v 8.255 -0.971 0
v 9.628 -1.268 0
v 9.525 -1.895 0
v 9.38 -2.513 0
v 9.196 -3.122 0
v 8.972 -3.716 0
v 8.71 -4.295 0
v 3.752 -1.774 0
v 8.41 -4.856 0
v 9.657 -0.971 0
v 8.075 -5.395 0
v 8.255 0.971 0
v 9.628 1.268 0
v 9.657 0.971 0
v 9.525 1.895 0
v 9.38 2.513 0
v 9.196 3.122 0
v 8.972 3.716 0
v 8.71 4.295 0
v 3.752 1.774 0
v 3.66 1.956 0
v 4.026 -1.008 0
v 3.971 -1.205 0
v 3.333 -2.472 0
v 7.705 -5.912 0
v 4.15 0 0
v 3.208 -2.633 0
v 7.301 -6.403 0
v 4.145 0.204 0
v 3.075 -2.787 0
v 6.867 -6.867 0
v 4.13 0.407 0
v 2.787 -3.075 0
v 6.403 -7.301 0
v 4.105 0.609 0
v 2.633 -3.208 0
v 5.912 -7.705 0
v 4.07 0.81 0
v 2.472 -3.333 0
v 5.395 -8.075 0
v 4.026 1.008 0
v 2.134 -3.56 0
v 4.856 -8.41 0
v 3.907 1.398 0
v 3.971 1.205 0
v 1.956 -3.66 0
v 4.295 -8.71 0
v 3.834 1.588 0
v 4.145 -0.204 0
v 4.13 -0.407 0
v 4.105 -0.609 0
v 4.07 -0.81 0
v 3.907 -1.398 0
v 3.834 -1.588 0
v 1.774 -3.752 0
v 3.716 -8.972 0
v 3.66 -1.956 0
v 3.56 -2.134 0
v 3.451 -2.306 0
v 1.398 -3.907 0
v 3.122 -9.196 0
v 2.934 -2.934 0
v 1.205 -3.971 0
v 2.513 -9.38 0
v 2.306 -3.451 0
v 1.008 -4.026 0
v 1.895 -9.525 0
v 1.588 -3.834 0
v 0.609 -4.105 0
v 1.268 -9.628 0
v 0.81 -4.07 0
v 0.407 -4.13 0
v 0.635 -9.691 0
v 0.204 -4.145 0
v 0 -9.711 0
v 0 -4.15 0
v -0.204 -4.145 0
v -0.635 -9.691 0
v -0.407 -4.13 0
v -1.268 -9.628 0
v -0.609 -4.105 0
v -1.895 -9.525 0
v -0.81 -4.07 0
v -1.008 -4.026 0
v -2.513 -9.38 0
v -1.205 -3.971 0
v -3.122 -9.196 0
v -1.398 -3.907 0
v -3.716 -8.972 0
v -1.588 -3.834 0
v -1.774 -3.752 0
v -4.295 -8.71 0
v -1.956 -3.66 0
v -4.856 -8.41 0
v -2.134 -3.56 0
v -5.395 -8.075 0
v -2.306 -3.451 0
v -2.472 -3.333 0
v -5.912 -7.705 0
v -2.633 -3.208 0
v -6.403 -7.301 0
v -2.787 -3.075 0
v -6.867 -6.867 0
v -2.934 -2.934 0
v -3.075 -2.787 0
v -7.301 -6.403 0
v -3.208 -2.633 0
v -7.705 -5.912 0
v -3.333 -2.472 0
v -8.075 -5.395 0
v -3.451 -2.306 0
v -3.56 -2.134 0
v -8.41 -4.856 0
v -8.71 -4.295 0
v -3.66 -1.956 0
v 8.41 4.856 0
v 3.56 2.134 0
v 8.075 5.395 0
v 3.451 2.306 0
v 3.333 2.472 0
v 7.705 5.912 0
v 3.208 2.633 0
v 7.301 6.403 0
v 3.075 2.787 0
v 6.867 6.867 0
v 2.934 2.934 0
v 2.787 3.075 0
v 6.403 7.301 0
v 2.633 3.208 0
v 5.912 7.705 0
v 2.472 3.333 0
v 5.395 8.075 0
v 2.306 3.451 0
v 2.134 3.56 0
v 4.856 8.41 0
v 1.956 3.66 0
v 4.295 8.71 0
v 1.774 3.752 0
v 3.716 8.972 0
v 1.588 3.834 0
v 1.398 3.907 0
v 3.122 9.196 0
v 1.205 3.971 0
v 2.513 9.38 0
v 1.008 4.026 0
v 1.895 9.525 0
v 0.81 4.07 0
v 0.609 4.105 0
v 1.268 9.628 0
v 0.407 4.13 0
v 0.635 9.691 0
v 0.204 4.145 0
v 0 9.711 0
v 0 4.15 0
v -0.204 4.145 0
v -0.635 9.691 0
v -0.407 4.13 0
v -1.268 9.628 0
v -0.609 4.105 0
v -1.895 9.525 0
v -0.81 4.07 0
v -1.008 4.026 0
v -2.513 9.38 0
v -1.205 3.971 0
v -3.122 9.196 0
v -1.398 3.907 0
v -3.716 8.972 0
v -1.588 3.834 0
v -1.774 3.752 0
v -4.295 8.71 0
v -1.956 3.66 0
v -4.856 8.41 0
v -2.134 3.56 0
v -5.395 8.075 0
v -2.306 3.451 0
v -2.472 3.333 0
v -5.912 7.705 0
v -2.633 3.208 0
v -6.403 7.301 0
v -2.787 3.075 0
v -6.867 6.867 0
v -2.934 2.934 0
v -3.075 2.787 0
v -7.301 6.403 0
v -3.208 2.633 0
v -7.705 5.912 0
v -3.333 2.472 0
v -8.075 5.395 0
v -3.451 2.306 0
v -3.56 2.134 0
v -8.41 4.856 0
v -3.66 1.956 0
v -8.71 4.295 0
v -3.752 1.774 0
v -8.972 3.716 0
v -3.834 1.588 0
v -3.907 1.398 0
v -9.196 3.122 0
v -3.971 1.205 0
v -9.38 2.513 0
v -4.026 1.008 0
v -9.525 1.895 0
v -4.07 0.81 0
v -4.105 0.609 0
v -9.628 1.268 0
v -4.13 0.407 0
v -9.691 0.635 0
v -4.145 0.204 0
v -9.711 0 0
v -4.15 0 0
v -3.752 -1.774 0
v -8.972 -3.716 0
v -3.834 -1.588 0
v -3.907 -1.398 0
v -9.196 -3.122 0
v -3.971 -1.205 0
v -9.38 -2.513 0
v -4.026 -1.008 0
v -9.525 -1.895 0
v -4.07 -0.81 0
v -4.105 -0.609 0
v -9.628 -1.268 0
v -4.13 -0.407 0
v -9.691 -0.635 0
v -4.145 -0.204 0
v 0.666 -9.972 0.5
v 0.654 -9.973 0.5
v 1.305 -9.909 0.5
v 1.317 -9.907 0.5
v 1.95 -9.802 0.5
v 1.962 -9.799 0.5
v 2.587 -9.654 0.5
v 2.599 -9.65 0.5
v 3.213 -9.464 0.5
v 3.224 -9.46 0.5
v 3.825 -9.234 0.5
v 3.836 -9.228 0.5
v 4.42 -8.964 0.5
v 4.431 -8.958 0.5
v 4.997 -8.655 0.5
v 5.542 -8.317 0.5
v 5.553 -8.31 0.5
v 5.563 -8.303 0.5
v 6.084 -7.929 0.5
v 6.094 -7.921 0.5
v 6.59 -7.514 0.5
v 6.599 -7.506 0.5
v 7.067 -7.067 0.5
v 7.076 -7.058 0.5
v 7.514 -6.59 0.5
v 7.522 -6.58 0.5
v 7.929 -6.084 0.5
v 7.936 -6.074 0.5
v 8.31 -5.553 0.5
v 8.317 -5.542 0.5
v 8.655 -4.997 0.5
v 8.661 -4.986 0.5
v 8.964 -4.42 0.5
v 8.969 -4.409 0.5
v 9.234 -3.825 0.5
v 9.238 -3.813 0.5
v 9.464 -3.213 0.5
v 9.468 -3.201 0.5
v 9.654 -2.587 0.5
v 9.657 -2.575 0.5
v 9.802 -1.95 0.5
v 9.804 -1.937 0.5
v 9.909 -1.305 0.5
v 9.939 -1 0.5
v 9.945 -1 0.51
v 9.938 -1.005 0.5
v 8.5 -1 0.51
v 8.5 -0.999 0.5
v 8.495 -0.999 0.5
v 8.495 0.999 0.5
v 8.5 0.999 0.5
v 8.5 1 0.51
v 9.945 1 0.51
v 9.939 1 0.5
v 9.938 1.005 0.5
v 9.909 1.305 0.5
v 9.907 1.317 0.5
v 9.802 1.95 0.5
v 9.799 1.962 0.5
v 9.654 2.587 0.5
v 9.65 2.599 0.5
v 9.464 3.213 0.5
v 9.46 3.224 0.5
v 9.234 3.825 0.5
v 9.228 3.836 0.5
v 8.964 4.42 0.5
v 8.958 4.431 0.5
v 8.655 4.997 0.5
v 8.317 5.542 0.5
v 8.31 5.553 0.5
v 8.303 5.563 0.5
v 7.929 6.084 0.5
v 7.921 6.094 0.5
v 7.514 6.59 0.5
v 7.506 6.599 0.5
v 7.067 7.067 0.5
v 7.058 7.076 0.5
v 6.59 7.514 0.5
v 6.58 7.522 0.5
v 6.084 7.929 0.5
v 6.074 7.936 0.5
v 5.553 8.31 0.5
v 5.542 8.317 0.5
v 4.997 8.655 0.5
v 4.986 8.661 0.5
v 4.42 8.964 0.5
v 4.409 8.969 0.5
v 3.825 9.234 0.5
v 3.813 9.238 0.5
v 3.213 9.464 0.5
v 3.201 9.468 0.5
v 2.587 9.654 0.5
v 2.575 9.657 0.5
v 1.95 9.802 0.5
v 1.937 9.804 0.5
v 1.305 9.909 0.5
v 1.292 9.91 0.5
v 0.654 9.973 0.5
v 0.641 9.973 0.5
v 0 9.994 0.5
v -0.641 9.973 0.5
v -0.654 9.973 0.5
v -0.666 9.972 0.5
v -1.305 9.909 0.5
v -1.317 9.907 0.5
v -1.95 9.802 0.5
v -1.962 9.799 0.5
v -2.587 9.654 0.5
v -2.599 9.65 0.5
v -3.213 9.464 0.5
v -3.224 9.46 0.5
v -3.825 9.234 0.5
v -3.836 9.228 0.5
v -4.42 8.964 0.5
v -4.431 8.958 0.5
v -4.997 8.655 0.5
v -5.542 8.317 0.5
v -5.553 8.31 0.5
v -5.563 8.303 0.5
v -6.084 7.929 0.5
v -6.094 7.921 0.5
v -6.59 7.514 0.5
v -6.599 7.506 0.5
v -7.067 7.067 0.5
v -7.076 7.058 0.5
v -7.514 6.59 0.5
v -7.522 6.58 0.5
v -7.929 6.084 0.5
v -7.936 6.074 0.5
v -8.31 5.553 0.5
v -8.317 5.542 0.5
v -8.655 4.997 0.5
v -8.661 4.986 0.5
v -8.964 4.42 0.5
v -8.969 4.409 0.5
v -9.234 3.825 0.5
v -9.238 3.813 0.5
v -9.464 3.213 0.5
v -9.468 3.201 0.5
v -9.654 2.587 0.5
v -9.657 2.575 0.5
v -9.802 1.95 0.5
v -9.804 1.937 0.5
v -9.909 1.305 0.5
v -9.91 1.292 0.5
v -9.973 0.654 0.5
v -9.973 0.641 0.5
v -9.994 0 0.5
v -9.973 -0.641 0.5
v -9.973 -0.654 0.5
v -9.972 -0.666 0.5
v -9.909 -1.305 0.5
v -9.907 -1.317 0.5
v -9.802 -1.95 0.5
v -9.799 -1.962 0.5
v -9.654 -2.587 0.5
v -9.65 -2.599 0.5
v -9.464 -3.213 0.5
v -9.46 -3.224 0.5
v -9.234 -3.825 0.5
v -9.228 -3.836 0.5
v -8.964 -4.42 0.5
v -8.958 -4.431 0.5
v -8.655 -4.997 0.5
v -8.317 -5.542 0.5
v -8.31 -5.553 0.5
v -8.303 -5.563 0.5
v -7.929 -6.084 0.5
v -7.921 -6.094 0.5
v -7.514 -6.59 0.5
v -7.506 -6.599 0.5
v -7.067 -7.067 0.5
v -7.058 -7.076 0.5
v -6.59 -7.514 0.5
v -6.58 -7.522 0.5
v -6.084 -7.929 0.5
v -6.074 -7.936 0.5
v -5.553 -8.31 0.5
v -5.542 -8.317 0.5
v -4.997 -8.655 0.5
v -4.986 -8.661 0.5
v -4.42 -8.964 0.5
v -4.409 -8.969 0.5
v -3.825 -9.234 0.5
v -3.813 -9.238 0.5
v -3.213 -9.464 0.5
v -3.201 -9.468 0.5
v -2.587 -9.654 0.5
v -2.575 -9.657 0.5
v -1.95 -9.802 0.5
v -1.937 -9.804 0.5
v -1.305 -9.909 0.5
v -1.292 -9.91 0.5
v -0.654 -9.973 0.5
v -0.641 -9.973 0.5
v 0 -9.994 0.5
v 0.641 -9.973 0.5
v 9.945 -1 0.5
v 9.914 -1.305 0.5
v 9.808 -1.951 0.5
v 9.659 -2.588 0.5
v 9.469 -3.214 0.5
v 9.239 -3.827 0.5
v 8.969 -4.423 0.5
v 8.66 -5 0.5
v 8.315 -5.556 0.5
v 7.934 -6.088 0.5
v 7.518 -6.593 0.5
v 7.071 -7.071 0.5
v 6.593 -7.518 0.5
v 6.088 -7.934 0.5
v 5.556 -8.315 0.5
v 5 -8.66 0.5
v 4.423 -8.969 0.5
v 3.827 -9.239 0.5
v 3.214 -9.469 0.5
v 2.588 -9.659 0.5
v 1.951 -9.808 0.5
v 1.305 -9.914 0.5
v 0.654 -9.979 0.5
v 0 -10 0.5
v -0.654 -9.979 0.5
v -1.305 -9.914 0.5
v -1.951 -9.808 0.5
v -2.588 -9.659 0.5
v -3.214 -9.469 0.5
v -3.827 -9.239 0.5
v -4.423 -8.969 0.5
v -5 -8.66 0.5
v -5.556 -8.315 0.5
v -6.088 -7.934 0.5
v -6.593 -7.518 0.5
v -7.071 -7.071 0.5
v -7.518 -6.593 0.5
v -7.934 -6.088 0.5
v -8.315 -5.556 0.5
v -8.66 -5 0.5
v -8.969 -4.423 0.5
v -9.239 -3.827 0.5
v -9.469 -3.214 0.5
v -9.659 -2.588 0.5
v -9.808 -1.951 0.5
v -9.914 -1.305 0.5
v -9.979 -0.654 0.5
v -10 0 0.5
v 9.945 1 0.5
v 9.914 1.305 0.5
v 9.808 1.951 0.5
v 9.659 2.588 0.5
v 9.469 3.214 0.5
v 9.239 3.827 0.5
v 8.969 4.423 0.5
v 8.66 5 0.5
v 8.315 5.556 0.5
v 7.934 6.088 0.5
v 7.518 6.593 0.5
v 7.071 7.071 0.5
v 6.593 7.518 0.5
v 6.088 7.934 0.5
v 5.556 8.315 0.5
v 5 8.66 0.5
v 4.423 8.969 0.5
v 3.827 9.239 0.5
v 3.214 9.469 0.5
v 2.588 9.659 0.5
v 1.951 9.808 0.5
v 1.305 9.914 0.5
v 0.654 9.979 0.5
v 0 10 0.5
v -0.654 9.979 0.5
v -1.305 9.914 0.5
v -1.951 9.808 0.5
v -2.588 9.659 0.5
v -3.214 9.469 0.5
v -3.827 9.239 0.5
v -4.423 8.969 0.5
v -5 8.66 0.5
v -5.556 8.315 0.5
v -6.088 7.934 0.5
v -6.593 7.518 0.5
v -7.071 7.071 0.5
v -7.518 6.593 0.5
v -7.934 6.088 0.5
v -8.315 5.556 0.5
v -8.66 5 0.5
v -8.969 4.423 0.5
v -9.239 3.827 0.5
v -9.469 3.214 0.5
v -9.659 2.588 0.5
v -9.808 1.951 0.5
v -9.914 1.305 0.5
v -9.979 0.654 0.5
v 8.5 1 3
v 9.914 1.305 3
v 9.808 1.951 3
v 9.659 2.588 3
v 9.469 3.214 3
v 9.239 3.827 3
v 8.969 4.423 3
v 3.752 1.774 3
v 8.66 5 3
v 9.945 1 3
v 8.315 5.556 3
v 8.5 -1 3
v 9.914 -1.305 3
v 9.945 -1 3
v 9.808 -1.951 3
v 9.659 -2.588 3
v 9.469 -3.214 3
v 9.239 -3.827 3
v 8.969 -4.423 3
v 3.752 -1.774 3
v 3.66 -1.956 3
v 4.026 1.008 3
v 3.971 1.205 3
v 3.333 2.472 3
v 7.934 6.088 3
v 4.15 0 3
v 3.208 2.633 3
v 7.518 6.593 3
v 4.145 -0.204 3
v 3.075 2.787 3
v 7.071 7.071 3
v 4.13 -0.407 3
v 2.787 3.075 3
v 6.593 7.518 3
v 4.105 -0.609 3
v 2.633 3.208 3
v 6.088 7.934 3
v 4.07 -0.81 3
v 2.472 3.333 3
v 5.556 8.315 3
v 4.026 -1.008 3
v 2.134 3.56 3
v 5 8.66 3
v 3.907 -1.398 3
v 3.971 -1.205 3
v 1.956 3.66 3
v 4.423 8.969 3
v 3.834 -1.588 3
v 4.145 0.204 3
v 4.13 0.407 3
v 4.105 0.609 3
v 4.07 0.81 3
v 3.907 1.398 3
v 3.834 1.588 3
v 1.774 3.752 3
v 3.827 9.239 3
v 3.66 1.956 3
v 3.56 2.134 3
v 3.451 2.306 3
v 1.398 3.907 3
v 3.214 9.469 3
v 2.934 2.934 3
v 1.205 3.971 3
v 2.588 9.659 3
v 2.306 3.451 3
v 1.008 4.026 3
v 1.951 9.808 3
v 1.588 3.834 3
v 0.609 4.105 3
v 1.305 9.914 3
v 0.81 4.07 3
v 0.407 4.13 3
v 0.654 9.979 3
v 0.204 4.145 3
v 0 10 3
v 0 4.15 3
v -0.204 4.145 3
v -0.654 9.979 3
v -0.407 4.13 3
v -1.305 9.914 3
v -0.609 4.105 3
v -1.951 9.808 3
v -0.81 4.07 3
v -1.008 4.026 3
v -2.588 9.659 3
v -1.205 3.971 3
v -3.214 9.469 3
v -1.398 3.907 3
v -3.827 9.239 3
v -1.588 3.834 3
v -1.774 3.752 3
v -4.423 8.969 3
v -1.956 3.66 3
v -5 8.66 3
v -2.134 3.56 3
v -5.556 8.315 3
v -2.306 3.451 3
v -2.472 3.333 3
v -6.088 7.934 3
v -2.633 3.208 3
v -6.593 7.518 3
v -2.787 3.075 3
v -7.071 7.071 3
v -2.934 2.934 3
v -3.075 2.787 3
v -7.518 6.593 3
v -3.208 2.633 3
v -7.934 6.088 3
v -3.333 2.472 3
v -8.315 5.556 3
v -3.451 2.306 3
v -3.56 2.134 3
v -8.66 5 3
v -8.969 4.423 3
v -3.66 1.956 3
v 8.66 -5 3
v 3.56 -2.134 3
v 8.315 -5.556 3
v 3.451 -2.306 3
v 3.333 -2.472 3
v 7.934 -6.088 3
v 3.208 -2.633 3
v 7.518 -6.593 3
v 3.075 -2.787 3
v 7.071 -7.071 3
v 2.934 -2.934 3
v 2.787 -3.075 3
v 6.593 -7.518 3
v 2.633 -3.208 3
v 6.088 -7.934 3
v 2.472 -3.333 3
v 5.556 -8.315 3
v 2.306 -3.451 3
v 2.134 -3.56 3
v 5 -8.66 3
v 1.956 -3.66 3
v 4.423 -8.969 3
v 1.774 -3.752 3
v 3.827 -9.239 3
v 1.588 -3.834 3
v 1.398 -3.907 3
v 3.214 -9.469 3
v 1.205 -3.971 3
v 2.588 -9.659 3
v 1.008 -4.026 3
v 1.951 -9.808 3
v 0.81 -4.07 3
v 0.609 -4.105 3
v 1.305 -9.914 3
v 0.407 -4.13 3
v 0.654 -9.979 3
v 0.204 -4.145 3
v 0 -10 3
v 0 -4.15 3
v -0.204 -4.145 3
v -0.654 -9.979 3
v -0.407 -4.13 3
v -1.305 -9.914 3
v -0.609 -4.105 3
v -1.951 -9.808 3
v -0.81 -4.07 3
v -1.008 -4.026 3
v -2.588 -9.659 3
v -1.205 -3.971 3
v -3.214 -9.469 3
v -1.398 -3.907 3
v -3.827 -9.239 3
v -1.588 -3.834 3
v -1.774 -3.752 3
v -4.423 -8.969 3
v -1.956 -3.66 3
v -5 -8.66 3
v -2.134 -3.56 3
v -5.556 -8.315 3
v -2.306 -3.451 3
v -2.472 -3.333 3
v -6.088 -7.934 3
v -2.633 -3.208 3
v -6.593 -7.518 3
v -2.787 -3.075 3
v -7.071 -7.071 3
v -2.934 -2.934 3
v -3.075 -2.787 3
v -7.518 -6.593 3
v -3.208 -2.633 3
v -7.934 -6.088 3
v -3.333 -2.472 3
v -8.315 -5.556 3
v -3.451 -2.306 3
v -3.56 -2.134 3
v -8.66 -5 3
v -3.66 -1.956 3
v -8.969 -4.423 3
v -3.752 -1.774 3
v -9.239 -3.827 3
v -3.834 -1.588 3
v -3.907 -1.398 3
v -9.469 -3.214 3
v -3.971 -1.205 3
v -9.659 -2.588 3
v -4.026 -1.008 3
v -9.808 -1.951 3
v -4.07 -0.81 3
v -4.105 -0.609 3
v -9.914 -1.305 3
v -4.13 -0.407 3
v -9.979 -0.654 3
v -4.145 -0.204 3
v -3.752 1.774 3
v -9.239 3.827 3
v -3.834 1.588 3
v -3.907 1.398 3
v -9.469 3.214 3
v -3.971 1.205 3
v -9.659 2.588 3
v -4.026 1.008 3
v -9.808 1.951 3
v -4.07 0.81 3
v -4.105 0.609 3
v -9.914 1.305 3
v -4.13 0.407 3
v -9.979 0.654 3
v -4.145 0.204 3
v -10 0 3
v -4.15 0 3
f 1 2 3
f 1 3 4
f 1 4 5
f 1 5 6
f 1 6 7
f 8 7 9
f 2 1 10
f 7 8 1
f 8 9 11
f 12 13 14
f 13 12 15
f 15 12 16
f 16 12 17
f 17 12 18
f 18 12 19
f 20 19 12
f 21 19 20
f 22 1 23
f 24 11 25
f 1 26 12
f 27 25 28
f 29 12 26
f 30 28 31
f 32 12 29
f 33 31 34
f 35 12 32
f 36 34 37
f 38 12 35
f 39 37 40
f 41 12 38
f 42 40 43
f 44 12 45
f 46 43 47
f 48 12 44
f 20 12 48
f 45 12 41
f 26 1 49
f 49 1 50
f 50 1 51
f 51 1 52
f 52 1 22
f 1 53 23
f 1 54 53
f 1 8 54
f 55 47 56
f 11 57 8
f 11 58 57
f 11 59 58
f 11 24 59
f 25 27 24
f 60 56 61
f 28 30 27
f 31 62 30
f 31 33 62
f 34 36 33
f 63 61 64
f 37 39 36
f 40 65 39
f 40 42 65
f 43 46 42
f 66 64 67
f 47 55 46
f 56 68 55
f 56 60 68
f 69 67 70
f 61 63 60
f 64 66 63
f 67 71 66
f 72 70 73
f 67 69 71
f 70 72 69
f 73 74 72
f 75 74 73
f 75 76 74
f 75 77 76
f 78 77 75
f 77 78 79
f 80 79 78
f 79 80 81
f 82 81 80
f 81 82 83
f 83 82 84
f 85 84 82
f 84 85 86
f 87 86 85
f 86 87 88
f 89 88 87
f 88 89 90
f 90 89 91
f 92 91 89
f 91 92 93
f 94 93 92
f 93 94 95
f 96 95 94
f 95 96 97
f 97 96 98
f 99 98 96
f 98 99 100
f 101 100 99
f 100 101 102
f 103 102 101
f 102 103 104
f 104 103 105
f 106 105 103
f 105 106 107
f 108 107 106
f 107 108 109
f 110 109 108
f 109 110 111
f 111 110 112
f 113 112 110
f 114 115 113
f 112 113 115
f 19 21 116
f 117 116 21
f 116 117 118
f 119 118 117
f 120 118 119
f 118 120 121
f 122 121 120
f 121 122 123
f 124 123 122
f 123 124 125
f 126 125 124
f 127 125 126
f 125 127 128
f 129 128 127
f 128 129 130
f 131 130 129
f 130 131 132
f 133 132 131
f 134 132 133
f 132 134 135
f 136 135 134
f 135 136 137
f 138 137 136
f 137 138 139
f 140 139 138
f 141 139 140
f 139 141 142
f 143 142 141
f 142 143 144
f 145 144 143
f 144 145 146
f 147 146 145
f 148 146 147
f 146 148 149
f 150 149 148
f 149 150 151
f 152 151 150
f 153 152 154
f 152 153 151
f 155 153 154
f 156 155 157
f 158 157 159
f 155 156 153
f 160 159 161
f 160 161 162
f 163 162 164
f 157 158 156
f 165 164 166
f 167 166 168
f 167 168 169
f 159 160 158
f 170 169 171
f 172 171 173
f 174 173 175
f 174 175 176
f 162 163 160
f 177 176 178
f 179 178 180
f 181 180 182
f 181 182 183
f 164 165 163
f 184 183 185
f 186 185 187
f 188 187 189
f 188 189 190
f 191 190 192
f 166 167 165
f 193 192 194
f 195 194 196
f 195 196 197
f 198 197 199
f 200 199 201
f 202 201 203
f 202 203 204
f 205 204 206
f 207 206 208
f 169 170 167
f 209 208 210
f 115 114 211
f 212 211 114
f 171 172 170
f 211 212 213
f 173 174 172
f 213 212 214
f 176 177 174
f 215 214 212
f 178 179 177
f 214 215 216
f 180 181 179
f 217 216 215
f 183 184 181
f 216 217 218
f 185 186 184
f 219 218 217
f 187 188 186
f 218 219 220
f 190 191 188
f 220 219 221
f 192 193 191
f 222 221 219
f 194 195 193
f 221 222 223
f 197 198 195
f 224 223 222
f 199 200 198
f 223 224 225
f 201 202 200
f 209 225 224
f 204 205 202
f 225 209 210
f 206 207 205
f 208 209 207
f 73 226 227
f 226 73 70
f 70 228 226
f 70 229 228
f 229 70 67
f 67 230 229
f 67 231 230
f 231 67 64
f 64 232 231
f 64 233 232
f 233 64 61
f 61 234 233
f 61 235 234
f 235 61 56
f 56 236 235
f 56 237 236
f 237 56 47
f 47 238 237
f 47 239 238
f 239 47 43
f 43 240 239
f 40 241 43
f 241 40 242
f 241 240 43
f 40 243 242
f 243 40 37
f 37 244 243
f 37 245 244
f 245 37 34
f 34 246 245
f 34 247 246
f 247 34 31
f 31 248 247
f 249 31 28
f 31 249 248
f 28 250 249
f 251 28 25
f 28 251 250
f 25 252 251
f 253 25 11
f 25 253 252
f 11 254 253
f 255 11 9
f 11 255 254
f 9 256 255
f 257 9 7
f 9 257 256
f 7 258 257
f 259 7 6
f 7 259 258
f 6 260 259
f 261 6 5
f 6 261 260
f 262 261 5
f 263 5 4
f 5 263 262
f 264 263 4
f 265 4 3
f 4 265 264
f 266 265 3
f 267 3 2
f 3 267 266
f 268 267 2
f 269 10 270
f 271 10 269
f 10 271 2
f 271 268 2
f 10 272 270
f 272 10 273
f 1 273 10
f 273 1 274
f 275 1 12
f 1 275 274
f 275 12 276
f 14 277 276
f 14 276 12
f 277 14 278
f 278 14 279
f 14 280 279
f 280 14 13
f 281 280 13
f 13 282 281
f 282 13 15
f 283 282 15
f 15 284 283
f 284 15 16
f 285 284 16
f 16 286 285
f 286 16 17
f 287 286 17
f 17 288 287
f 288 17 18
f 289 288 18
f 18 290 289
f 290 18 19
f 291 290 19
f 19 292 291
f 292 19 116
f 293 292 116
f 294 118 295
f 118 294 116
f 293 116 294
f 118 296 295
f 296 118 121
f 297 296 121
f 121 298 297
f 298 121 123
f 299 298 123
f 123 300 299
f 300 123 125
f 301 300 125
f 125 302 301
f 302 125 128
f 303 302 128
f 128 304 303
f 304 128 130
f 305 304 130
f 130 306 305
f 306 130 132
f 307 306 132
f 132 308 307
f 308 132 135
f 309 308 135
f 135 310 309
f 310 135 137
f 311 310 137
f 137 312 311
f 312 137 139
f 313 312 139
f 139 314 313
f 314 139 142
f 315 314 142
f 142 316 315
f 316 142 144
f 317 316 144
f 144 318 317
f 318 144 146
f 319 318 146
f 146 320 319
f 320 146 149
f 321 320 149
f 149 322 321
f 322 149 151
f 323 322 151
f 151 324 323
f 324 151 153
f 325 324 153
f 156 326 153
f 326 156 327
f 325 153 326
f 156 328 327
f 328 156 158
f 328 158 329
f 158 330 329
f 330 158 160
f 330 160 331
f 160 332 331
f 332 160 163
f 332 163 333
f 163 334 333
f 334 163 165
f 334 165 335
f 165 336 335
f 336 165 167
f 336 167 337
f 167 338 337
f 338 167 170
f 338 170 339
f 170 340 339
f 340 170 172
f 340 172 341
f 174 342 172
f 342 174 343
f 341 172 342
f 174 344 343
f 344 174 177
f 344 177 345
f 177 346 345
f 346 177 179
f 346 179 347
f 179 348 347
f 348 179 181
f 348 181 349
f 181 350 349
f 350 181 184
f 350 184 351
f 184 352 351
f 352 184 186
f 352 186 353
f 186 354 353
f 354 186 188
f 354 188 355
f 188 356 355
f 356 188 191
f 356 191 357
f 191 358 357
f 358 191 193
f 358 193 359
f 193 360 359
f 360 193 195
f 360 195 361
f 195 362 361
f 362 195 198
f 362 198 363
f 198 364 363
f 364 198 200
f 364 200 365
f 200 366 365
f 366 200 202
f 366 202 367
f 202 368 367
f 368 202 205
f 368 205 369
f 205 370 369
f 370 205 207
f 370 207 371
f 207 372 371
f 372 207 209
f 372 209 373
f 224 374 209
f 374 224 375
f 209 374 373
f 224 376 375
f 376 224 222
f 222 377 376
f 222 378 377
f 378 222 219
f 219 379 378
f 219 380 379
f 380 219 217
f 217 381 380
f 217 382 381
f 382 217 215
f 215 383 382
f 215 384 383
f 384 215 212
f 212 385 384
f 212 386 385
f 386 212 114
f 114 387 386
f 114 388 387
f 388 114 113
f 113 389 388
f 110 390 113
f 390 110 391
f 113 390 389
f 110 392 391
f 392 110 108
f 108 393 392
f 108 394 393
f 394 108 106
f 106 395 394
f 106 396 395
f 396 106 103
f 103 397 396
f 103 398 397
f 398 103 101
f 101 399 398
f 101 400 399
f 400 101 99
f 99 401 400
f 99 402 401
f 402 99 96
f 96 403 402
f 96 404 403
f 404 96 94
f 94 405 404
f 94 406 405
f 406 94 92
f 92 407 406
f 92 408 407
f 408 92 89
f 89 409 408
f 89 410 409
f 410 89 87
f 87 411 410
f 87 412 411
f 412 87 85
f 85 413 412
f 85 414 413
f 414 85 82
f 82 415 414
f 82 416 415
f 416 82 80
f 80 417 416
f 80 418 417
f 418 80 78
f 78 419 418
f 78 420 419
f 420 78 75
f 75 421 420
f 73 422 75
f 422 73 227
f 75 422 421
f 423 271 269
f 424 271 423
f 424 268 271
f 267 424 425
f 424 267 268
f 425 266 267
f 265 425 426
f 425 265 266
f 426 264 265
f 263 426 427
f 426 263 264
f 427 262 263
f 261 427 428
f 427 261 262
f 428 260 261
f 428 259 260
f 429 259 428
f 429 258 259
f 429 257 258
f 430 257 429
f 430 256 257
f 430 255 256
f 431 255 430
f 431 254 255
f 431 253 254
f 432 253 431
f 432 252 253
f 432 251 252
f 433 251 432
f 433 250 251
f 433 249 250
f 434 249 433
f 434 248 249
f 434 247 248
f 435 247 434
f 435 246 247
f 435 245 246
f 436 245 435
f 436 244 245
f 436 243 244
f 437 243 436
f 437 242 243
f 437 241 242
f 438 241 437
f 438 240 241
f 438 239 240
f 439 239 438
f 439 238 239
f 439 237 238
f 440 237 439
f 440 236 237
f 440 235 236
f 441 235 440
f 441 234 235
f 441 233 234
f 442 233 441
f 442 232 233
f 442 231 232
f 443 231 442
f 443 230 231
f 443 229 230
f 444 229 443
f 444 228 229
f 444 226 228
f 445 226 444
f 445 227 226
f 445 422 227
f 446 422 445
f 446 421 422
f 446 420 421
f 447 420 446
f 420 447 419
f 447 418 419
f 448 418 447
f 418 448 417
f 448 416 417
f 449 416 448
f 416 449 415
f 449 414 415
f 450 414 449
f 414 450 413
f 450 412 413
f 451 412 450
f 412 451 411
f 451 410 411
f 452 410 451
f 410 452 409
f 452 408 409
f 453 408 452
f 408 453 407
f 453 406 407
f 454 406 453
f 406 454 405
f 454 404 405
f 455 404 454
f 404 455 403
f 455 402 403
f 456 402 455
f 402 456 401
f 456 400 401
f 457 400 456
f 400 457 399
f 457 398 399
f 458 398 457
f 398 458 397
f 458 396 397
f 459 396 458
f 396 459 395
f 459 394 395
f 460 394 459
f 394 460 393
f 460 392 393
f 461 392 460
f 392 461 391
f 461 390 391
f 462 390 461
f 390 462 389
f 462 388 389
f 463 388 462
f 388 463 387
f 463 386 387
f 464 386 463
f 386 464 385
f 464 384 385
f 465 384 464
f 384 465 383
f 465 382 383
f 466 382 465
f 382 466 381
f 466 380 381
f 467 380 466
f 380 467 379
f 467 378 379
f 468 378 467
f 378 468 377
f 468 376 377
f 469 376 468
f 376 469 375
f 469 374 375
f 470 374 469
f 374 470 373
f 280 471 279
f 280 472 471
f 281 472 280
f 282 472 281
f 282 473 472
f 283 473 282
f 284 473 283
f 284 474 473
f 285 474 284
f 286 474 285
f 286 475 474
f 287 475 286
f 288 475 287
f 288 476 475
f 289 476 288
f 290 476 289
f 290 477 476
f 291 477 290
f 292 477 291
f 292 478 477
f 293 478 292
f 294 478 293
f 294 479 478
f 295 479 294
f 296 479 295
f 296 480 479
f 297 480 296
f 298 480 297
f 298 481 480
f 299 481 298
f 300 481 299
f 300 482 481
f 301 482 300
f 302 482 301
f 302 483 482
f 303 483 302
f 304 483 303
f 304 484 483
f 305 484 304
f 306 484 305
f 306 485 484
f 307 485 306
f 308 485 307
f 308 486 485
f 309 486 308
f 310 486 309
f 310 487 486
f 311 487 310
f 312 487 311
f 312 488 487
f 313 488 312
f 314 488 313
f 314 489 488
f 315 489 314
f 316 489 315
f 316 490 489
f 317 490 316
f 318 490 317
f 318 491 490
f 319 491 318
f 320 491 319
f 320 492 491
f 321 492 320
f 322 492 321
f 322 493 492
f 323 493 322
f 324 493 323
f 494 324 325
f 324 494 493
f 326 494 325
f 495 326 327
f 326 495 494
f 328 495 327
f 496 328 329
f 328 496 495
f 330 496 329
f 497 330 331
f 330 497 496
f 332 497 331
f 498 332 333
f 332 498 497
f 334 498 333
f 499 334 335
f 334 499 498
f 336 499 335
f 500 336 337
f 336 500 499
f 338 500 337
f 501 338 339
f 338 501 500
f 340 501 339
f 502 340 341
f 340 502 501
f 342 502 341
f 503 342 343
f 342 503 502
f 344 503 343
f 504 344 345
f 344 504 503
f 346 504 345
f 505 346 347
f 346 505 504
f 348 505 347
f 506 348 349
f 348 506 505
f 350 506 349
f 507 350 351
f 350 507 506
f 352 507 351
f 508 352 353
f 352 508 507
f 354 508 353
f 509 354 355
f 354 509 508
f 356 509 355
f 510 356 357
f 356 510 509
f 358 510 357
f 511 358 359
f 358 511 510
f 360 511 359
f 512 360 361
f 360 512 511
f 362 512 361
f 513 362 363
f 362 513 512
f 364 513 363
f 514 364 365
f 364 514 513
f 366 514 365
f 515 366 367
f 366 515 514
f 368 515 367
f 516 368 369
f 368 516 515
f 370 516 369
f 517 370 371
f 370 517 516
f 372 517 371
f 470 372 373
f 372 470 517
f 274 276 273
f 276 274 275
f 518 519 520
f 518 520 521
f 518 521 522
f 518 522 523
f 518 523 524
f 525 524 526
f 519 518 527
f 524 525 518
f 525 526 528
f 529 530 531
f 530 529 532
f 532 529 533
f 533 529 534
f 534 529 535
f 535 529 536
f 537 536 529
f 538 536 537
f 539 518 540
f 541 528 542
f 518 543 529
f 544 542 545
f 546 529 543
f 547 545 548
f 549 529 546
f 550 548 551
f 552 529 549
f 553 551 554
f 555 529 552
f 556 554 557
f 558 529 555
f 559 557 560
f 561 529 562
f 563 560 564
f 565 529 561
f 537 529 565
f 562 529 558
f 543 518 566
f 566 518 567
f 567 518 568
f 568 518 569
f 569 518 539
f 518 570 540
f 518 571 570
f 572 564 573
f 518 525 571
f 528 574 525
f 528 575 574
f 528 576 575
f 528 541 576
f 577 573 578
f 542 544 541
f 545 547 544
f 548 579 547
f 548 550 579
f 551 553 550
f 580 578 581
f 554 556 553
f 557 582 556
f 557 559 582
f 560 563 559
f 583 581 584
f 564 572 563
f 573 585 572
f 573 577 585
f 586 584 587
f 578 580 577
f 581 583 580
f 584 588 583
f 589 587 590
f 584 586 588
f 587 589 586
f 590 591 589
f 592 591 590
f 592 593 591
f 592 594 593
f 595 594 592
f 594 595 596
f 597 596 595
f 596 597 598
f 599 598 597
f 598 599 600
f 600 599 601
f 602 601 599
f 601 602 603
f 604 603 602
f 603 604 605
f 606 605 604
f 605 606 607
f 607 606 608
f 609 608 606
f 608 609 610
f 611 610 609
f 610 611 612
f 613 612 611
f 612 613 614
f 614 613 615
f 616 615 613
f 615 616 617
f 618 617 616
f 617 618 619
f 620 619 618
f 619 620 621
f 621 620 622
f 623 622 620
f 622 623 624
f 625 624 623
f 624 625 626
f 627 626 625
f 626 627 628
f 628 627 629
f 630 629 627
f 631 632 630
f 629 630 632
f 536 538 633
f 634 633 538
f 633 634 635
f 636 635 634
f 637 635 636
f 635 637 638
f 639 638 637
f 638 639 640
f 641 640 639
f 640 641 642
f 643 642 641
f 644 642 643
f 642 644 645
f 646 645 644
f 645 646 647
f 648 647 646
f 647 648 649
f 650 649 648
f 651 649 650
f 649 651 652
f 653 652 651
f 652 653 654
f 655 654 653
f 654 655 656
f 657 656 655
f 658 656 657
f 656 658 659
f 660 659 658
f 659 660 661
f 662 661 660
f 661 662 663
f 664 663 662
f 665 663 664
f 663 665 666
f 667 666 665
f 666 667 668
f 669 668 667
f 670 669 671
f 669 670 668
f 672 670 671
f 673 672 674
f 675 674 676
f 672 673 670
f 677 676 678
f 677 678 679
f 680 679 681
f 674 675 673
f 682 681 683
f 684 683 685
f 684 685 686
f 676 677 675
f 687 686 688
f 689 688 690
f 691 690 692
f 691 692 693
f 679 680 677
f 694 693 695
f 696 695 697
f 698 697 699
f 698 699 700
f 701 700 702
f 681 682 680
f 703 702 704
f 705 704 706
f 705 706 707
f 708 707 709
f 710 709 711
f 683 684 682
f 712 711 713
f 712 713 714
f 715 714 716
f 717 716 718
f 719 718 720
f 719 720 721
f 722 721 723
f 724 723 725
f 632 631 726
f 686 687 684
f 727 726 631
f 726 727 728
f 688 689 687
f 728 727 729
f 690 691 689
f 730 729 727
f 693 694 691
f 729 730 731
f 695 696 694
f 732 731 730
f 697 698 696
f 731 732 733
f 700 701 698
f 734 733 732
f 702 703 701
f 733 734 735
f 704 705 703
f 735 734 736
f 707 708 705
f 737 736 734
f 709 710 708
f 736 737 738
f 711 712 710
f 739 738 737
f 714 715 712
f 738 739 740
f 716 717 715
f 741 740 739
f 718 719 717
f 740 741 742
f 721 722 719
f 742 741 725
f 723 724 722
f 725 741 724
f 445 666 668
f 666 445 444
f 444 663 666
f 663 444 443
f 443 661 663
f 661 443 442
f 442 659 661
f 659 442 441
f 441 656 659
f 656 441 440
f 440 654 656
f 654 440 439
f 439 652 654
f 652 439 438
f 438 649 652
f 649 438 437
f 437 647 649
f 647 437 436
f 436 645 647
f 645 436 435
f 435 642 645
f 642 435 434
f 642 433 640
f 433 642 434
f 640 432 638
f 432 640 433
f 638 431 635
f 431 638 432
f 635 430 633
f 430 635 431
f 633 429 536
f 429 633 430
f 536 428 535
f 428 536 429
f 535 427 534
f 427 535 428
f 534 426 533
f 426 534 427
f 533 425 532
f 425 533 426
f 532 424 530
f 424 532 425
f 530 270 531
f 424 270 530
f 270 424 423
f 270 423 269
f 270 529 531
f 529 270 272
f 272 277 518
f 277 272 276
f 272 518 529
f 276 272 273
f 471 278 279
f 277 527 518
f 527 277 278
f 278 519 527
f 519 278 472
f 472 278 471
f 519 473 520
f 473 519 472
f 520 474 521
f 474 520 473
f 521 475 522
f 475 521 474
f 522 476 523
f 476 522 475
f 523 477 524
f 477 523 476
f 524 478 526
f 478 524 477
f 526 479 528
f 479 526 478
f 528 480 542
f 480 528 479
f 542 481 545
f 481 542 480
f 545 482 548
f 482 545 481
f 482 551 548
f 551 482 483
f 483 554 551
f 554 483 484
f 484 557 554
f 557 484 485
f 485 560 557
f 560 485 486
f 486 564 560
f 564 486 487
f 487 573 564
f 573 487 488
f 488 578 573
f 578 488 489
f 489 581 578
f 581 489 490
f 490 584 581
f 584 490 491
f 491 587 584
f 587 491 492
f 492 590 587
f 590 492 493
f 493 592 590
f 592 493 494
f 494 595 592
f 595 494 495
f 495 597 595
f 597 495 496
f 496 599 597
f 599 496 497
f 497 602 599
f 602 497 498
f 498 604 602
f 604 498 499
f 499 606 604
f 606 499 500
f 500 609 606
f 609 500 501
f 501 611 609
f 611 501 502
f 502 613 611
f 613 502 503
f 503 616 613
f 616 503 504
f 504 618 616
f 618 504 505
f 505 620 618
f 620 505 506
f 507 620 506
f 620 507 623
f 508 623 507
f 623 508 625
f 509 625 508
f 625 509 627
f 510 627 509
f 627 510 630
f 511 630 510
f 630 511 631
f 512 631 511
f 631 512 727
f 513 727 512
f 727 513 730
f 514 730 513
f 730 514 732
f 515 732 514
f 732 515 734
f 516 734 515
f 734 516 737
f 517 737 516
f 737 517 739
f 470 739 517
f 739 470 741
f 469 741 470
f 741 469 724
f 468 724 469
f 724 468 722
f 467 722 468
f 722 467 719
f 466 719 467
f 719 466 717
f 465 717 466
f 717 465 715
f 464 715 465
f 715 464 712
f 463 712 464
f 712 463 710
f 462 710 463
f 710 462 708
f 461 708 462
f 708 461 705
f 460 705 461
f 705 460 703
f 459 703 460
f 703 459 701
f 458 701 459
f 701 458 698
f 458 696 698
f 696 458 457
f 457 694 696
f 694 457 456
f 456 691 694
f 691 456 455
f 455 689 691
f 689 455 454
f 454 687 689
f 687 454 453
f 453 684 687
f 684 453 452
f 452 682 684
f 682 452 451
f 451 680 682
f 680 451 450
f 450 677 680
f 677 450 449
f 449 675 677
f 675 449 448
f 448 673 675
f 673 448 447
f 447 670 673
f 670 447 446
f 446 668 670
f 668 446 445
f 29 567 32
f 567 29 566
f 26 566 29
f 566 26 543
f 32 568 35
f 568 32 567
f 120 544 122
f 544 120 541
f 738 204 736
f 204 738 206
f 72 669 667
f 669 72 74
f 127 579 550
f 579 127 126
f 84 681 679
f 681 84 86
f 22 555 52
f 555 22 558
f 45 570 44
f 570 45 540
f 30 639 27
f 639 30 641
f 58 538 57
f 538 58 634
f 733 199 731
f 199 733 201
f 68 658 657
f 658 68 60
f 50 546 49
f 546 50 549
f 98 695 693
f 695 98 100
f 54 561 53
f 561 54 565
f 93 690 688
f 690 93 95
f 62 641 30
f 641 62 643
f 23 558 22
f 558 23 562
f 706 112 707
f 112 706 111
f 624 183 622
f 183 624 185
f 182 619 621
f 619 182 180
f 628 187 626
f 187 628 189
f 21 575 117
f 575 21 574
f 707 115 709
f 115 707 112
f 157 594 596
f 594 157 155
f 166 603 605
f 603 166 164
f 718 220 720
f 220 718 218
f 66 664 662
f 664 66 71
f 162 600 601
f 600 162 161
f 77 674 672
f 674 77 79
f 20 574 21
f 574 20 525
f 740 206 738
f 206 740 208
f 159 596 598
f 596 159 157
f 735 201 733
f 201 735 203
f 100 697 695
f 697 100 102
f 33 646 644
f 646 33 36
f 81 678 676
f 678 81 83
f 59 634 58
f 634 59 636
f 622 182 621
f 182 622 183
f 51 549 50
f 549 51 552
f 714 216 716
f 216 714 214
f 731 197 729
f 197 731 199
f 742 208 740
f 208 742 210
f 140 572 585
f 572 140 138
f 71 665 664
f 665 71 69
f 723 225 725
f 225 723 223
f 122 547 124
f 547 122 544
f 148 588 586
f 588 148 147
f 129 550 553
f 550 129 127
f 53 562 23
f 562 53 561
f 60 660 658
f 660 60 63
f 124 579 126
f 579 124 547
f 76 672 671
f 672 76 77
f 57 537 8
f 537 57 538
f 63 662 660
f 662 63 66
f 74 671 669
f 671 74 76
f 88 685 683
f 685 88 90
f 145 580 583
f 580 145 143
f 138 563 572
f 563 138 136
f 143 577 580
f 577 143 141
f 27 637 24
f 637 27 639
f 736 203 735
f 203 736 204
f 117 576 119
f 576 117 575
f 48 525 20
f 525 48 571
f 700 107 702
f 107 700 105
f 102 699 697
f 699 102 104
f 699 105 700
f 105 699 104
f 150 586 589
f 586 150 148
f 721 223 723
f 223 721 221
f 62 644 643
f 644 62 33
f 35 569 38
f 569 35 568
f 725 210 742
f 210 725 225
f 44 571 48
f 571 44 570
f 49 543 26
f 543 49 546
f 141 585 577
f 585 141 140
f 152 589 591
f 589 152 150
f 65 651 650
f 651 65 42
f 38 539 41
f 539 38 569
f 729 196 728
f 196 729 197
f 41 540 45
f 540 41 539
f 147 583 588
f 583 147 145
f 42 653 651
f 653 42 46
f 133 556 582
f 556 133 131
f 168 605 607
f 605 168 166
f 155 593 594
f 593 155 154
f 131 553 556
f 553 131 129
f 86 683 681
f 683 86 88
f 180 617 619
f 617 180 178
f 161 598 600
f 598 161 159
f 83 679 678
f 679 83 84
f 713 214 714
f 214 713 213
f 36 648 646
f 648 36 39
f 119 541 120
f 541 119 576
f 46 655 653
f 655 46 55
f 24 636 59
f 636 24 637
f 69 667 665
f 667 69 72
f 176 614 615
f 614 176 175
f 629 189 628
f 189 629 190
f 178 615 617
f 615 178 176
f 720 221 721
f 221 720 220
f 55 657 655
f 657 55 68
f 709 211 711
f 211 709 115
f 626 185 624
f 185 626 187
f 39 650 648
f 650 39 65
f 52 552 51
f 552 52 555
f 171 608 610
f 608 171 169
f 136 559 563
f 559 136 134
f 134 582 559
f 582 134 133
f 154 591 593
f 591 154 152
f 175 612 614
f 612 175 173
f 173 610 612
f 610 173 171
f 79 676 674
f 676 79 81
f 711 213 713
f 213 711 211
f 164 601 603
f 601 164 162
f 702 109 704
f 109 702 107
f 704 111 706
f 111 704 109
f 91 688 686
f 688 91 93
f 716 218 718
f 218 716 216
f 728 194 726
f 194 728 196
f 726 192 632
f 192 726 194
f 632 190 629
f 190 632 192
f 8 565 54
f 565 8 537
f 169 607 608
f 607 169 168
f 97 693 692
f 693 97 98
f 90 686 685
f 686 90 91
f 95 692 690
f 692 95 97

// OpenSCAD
// TEMPLATE: flat spacer / gasket ring — a bore that slides over a bolt or shaft, an outer diameter, a thickness; optional parallel flats (wrench/keying) and a keying notch on the OD
// Interfaces: bolt_d (the bolt's outer diameter) + clearance -> bore. Origin on the bore axis, bottom face on z = 0.
// Print flat (a pure extrusion, no overhangs); the bed-side outer edge gets a light 60° chamfer so the first layer lifts off cleanly.

/* [Interface] */
bolt_d = 8.0;            // [3:0.1:40]  diameter of the bolt / shaft that passes through
clearance = 0.3;         // [0:0.05:0.8]  added to the bore diameter
outer_d = 20;            // [8:0.5:80]
thickness = 3;           // [0.8:0.1:20]

/* [Options] */
flats = false;           // two parallel flats on the outer diameter (for a wrench, or to key against a wall)
across_flats = 17;       // [6:0.5:80]  distance between the flats
notch = true;            // radial keying notch in the outer edge
notch_w = 2;             // [1:0.25:8]
notch_depth = 1.5;       // [0.5:0.25:8]
bed_chamfer = 0.5;       // [0:0.1:1.5]  height of the 60° chamfer on the bottom outer edge

/* [Render] */
render_target = "part";  // [part, coupon, assembly]

/* [Hidden] */
$fn = 96;
bore = bolt_d + clearance;
wall = (outer_d - bore) / 2;
flat_wall = (across_flats - bore) / 2;
chamfer_w = bed_chamfer / tan(60);                 // radial width of the 60° bed chamfer
chamfer_scale = (outer_d / 2 - chamfer_w) / (outer_d / 2);

assert(outer_d > bore + 3.2, "outer_d leaves less than a 1.6 mm wall around the bore");
assert(!flats || across_flats > bore + 3.2, "across_flats leaves less than a 1.6 mm wall around the bore");
assert(!flats || across_flats < outer_d, "across_flats must be smaller than outer_d");
assert(!notch || wall - notch_depth >= 1.6, "the notch cuts the wall below 1.6 mm");
assert(thickness > 2 * bed_chamfer, "thickness must exceed twice the bed chamfer");
echo(bore = bore, wall = wall, min_wall = notch ? wall - notch_depth : (flats ? flat_wall : wall));

module body2d() {
    // outer outline without the bore: circle, optionally clipped by two flats, optionally notched
    difference() {
        intersection() {
            circle(d = outer_d);
            if (flats) square([outer_d + 2, across_flats], center = true);
        }
        if (notch) translate([outer_d / 2 - notch_depth, -notch_w / 2]) square([notch_depth + 1, notch_w]);
    }
}

module ring(bore_d, t) {
    difference() {
        union() {
            // chamfered bottom band (scaled about the axis), then the straight body
            linear_extrude(height = bed_chamfer + 0.01, scale = 1 / chamfer_scale) scale(chamfer_scale) body2d();
            translate([0, 0, bed_chamfer]) linear_extrude(height = t - bed_chamfer) body2d();
        }
        translate([0, 0, -1]) cylinder(d = bore_d, h = t + 2, $fn = 128);
    }
}

module part() { ring(bore, thickness); }

module coupon() {
    // fit ladder: one plate carrying three bosses with the bore at clearance -0.2 / 0 / +0.2, labels embossed on the plate
    pitch = bore + 8;
    plate = [3 * pitch + 4, bore + 13, 1.2];
    difference() {
        union() {
            translate([-plate[0] / 2, -plate[1] / 2, 0]) cube(plate);
            for (i = [-1, 0, 1]) translate([i * pitch, 0, 0]) cylinder(d = bore + 5, h = plate[2] + thickness);
            for (i = [-1, 0, 1]) translate([i * pitch, plate[1] / 2 - 3.2, plate[2]])
                linear_extrude(0.6) text(str(i * 0.2), size = 2.6, halign = "center", $fn = 16);
        }
        for (i = [-1, 0, 1]) translate([i * pitch, 0, -1]) cylinder(d = bore + i * 0.2, h = plate[2] + thickness + 2, $fn = 128);
    }
}

module assembly() {
    part();
    %translate([0, 0, -8]) cylinder(d = bolt_d, h = thickness + 16);                       // the bolt
    %translate([0, 0, -3]) cylinder(d = outer_d + 6, h = 3);                              // the surface it sits on
    %translate([0, 0, thickness + 0.3]) cylinder(d = bolt_d * 1.8, h = 0.8 * bolt_d, $fn = 6); // the nut
}

if (render_target == "part") part();
else if (render_target == "coupon") coupon();
else assembly();
